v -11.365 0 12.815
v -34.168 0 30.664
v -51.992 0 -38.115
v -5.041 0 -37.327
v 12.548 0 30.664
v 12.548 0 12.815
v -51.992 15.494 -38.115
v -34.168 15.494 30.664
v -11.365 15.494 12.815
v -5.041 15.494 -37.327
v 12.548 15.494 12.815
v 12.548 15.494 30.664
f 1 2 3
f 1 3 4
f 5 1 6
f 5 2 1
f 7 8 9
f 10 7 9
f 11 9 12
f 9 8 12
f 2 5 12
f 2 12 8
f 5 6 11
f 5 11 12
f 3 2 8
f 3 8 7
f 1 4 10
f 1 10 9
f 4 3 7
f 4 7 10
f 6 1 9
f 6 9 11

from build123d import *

# Parameters (mm, degrees)
F1_DEPTH = 15.494


with BuildPart() as f1:
    # F0 (on Front) → F1 (new body)
    with BuildSketch(Plane.XZ):
        Polygon((-34.167524, 30.66401), (-51.991723, -38.114682), (-5.041494, -37.326522), (-11.365365, 12.815122), (-13.61647, 30.66401), align=None)
        Polygon((12.548127, 30.66401), (-13.61647, 30.66401), (-11.365365, 12.815122), (12.548127, 12.815122), align=None)
    extrude(amount=-F1_DEPTH)


solid = f1.part
